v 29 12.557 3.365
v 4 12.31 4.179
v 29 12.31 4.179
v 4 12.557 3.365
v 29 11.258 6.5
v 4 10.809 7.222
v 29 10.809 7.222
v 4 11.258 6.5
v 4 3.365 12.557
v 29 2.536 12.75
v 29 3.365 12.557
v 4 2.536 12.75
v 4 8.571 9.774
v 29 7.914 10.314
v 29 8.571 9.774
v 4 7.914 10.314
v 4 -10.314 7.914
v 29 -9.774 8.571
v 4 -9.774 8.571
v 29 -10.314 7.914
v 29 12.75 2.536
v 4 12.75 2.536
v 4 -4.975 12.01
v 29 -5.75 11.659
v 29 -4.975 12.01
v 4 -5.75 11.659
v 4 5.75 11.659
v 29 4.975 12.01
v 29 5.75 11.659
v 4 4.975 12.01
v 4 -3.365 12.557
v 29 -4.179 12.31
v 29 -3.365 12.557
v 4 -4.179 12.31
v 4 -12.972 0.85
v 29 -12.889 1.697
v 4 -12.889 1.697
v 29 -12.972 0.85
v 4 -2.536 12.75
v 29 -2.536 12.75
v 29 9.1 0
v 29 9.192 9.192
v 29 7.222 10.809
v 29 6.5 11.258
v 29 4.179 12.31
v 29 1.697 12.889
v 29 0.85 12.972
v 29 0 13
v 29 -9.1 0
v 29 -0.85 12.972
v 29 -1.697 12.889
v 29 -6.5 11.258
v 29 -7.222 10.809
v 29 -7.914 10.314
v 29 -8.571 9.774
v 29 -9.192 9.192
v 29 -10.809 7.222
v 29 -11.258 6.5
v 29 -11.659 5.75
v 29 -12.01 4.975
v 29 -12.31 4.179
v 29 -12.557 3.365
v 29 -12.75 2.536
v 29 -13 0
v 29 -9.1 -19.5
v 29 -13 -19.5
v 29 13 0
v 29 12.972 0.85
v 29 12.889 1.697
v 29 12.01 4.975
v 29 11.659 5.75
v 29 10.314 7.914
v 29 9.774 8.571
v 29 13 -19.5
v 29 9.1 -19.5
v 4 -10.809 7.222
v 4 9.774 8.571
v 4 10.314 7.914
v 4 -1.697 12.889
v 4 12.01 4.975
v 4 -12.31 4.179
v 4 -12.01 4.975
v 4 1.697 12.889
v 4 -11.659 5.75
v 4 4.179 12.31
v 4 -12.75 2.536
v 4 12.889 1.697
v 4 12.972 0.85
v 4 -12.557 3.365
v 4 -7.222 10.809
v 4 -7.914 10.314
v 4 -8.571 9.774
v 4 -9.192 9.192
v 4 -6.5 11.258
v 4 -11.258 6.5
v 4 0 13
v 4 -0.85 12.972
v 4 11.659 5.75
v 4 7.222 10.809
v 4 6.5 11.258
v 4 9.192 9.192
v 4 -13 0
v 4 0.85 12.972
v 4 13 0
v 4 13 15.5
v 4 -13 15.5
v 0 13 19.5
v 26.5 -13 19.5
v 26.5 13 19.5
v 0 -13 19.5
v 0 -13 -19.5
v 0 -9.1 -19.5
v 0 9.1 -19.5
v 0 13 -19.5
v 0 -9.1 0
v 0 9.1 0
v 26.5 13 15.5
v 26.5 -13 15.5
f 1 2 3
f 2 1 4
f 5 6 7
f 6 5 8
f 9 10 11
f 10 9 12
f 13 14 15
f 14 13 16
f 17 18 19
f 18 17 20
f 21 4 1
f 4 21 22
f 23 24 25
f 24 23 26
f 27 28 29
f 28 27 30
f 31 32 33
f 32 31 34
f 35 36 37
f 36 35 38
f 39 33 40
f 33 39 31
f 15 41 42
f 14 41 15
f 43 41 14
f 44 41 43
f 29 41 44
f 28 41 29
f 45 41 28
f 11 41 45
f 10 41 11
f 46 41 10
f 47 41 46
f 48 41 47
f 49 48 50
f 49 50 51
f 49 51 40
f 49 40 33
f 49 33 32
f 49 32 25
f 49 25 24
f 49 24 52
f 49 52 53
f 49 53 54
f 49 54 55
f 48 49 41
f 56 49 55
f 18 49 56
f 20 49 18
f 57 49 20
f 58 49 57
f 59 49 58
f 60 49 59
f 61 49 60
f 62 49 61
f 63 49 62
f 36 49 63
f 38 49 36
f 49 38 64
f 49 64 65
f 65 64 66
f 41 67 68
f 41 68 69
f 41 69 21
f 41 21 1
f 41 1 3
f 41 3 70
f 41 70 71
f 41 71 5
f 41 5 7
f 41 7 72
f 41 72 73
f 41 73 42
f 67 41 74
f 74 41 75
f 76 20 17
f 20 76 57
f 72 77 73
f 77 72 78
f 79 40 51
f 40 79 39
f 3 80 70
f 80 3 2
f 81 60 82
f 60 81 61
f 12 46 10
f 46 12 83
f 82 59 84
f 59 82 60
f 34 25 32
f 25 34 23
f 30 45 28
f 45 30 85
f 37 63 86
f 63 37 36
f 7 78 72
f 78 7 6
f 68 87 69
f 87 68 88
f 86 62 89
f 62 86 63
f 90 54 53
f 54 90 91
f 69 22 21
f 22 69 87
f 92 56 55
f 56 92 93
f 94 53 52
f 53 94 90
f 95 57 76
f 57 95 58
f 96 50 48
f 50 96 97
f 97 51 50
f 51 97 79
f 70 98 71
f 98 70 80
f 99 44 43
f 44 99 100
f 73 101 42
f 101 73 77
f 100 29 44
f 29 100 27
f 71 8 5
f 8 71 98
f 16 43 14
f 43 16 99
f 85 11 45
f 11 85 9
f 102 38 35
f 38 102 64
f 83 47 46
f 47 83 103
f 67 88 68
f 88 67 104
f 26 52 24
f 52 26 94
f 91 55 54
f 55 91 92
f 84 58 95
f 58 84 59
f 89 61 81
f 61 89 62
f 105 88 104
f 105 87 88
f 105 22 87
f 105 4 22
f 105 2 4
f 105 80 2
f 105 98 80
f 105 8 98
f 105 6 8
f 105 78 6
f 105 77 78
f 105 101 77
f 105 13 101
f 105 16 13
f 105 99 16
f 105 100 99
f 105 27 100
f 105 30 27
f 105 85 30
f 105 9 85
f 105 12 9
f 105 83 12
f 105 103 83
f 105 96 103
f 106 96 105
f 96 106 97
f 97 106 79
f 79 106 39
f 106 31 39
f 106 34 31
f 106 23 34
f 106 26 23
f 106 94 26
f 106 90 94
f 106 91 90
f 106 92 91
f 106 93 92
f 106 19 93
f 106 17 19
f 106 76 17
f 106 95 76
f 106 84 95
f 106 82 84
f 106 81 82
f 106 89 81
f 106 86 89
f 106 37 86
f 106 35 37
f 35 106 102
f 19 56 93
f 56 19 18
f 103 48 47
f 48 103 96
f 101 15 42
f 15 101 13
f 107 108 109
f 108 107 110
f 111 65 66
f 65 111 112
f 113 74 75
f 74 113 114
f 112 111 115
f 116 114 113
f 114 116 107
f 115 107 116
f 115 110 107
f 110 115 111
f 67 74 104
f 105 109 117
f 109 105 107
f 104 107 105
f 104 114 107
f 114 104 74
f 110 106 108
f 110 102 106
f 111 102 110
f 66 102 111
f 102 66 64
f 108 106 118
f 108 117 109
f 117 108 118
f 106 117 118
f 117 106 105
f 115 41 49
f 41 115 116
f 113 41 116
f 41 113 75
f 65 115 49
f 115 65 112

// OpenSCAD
belt_width = 50;
belt_thickness = 1;
belt_clearance = belt_thickness * 2.5;
plywood_thickness = 18.2;
end_cap_thickness = 4;
guide_radius = 13;
retainer_gap = 5;
screw_hole_diameter = 4;
dowel_diameter = 8;
dowel_length = 30;

end_cap_height = guide_radius+belt_clearance+end_cap_thickness;

difference () {
  union () {
    // Belt guide
    translate([end_cap_thickness,0,0]) {
      rotate ([0,90,0]) {
        cylinder($fn=96,r=guide_radius, h=belt_width/2);
      }
    }
    // End cap
    translate([0,-guide_radius,-end_cap_height]) {
      cube([end_cap_thickness, guide_radius*2, 2*end_cap_height]);
    }
    // Mounting plate
    translate([end_cap_thickness,-guide_radius,-end_cap_height]) {
      cube([belt_width/2, guide_radius*2, end_cap_height]);
    }
    // Retainer plate
    translate([end_cap_thickness,-guide_radius,end_cap_height-end_cap_thickness]) {
      cube([belt_width/2 - retainer_gap/2, guide_radius*2,end_cap_thickness]);
    }      
  }
  // Slot for the plywood
  translate([-0.1,-plywood_thickness/2,-end_cap_height-0.1]) {
    cube([end_cap_thickness+0.2+(belt_width/2),plywood_thickness,end_cap_height+0.1]);
  }
  /* // Screw hole */
  /* translate([(end_cap_thickness+plywood_thickness)/2, */
  /*            -(plywood_thickness-end_cap_thickness)/2, */
  /*            -plywood_thickness/2]) { */
  /*   rotate([90,0,0]) { */
  /*     cylinder($fn=24,r=screw_hole_diameter/2, h = end_cap_thickness + 0.2); */
  /*   } */
  /* } */
  /* // Dowel hole */
  /* translate([end_cap_thickness+(belt_width/2)-(dowel_length/2)+0.1,0,guide_radius/2]) { */
  /*   rotate([0,90,0]) { */
  /*     cylinder($fn=24,r=dowel_diameter/2,h=dowel_length/2+0.2); */
  /*   } */
  /* } */
}
